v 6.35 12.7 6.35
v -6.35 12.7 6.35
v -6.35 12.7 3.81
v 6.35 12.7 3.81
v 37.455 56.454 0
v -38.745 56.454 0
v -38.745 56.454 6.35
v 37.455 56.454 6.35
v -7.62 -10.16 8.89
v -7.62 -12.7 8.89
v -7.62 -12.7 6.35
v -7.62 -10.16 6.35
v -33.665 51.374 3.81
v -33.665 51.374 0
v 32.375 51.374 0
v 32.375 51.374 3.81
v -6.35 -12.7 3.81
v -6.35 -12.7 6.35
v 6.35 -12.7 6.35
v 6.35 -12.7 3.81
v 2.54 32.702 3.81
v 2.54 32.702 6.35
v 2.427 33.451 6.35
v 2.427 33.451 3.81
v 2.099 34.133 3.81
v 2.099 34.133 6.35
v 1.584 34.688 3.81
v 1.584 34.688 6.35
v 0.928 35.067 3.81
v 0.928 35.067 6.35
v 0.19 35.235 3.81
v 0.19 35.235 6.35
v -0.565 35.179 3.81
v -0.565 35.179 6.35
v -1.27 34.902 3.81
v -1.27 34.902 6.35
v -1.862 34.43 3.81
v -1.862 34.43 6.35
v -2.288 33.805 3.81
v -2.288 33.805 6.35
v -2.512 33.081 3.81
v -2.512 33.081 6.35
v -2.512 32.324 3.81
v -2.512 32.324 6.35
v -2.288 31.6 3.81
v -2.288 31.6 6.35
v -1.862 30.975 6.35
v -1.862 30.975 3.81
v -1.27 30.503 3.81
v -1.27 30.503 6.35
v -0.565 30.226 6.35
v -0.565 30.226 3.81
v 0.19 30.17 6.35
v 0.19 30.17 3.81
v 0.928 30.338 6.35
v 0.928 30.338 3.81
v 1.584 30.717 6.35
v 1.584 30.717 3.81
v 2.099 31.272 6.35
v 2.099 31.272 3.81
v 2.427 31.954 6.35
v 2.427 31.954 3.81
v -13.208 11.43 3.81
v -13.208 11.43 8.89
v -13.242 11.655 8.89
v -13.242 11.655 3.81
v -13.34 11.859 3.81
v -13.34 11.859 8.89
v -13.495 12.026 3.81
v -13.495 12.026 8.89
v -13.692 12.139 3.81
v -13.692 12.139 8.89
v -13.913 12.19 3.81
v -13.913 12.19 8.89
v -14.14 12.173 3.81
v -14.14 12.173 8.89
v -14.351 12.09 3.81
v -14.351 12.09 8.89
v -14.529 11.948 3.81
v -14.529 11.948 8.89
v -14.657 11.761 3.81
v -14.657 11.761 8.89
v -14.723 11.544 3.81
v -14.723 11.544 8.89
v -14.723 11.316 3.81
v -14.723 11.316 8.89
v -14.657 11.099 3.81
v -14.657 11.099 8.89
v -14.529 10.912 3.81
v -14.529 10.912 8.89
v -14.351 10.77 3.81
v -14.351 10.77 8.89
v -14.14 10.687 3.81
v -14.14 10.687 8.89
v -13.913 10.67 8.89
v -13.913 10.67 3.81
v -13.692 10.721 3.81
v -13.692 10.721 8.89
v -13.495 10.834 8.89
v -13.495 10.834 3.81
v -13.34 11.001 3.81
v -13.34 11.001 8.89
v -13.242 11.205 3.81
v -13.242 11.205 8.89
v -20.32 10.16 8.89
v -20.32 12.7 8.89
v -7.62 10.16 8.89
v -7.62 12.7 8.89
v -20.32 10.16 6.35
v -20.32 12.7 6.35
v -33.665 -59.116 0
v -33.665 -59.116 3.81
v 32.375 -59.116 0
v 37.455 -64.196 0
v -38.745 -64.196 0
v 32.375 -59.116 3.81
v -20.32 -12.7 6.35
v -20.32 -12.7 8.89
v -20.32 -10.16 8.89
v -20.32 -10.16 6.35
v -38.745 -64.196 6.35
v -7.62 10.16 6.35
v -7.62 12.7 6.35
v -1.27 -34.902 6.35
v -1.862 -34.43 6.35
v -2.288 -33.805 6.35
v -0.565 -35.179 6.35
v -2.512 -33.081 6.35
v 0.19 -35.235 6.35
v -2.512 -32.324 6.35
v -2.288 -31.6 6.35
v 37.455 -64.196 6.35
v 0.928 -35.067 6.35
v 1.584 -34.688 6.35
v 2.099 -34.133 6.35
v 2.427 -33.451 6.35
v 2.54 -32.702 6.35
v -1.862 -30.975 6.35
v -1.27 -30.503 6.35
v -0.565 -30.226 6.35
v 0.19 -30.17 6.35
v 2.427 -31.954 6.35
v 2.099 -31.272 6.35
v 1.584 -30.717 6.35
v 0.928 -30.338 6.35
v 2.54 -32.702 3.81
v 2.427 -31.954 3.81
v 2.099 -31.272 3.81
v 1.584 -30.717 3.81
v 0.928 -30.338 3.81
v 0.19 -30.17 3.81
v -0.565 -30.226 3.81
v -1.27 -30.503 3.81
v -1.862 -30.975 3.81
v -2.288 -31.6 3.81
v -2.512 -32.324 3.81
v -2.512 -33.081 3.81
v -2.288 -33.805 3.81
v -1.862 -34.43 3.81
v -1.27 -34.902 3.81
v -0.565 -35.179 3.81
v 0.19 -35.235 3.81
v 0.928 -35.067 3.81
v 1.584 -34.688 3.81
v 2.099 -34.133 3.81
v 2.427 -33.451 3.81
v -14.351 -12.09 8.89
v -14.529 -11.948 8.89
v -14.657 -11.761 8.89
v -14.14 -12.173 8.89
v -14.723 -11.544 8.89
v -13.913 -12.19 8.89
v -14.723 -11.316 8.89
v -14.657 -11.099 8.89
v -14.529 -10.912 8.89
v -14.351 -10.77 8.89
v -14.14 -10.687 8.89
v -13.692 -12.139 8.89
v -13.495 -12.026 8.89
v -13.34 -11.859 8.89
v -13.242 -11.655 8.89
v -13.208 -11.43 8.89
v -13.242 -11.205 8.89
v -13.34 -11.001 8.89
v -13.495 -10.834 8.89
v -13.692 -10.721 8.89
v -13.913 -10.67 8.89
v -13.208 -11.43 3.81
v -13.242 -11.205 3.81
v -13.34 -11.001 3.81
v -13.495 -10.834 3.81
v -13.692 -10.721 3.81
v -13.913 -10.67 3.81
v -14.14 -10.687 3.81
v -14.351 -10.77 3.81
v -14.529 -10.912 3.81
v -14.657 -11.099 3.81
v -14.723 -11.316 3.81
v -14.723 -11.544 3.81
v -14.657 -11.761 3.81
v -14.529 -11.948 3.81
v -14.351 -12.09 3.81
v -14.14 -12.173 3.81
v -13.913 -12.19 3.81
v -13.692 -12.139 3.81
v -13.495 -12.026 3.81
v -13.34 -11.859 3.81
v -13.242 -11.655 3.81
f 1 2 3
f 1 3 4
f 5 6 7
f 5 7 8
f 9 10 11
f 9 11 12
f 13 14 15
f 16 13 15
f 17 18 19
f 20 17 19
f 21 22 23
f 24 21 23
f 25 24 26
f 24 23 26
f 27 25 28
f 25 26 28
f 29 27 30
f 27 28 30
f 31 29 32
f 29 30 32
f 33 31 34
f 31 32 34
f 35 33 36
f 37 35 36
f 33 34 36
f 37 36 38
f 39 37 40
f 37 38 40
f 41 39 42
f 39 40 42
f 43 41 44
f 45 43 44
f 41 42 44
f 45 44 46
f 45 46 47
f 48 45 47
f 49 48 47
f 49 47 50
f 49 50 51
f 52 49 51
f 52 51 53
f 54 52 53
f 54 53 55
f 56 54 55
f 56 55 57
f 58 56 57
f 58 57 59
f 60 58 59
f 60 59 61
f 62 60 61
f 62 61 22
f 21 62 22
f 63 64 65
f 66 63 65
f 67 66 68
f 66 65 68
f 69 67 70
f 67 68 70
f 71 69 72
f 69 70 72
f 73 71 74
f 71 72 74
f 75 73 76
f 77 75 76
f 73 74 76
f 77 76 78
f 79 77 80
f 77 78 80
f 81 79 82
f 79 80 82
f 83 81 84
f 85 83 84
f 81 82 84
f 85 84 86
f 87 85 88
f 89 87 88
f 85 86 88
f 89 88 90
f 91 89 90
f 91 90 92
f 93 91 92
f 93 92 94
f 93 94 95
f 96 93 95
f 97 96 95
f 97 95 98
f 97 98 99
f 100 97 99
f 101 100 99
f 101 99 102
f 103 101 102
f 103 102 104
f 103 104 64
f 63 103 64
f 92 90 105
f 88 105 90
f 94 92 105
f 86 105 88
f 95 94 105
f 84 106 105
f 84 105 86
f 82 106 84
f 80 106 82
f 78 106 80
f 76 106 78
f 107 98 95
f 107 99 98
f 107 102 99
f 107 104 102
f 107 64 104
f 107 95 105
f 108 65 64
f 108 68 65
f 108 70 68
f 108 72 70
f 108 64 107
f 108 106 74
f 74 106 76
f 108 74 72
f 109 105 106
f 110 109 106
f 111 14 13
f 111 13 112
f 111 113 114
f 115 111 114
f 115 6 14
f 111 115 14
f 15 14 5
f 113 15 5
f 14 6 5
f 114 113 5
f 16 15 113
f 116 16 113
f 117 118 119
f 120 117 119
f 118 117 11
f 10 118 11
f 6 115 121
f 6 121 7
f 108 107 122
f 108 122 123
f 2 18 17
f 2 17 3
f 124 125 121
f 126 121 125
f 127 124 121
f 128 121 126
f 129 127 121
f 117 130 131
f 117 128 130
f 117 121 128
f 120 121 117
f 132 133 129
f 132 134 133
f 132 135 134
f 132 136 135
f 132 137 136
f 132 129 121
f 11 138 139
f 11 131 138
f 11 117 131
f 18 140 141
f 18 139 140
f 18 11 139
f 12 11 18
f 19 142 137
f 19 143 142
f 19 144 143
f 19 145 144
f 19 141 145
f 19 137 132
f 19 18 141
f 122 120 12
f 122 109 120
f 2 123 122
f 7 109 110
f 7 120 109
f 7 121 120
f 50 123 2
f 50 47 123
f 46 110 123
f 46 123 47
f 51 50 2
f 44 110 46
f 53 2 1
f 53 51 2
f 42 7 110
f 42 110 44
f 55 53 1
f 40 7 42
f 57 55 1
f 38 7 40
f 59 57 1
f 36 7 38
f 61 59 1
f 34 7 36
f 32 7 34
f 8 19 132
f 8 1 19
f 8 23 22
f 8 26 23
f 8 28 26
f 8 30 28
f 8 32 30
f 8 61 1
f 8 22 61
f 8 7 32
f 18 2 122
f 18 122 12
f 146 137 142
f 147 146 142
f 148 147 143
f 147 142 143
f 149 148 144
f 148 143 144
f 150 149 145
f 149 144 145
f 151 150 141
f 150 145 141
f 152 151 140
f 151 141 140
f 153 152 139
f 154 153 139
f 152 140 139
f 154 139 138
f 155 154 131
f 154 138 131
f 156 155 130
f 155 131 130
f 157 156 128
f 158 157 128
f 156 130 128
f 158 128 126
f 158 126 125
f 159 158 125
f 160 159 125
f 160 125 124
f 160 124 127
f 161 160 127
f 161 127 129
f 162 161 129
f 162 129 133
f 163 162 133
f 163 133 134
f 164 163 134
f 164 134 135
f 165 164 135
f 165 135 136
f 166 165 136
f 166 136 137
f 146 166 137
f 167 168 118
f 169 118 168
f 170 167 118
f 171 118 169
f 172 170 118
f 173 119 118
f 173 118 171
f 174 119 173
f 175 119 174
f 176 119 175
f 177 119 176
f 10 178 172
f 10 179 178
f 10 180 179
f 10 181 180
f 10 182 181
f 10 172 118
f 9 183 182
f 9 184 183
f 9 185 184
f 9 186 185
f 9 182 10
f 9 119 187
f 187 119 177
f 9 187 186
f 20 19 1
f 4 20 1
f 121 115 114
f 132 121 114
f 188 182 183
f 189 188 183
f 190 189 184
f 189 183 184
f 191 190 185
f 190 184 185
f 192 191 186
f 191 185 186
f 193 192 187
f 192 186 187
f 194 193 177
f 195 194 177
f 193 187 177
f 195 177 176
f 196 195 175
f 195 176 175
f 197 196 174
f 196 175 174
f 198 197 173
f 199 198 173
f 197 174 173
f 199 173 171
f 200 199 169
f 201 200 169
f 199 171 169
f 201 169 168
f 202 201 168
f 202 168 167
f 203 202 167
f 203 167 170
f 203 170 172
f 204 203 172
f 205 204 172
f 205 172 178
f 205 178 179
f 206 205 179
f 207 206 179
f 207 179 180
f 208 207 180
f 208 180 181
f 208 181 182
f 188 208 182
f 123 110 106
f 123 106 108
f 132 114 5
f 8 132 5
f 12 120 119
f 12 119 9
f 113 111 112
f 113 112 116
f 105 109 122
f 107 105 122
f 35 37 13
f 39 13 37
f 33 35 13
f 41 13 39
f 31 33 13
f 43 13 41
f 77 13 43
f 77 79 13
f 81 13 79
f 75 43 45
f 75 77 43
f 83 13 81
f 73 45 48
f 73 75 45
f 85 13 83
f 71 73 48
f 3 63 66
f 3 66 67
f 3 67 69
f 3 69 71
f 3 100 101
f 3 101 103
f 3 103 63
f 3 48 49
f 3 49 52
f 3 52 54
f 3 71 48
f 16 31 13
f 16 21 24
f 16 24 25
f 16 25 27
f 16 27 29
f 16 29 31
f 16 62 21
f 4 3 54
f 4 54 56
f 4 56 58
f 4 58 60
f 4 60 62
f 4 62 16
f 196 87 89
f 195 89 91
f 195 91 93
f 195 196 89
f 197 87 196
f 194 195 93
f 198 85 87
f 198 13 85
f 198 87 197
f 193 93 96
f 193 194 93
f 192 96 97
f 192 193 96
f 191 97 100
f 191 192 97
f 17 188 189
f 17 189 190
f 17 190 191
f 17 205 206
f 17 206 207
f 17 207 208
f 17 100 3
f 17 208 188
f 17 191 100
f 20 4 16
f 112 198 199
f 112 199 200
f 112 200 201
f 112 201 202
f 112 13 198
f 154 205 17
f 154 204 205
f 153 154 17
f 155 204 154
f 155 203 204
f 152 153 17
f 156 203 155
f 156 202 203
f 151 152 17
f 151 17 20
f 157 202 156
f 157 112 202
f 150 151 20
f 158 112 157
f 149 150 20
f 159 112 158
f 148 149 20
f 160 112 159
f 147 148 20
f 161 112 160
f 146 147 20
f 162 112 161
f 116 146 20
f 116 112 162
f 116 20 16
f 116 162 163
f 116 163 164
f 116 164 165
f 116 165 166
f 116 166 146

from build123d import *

# Parameters (mm, degrees)
F0_W      = 76.2
F0_H      = 120.65
F1_DEPTH  = 6.35
F2_W      = 12.7
F2_H      = 25.4
F3_DEPTH  = 6.35
F4_R      = 2.54
F5_DEPTH  = 6.35
F6_W      = 12.7
F6_H      = 2.54
F7_DEPTH  = 2.54
F8_R      = 0.762
F9_R      = 0.762
F10_DEPTH = 11.938
F11_W     = 66.04
F11_H     = 110.49
F12_DEPTH = 3.81


with BuildPart() as f1:
    # F0 (on Top) → F1 (new body)
    with BuildSketch(Plane.XY):
        with Locations((-0.644507, -3.87145)):
            Rectangle(F0_W, F0_H)
    extrude(amount=F1_DEPTH)

    # F2 (on face) → F3 (cut)
    with BuildSketch(Plane.XY.offset(6.35)):
        Rectangle(F2_W, F2_H)
    extrude(amount=-F3_DEPTH, mode=Mode.SUBTRACT)

    # F4 (on face) → F5 (cut)
    with BuildSketch(Plane.XY.offset(6.35)):
        with Locations((0, -32.7025)):
            Circle(F4_R)
        with Locations((0, 32.7025)):
            Circle(F4_R)
    extrude(amount=-F5_DEPTH, mode=Mode.SUBTRACT)

    # F6 (on face) → F7 (join)
    with BuildSketch(Plane.XY.offset(6.35)):
        with Locations((-13.97, 11.43)):
            Rectangle(F6_W, F6_H)
        with Locations((-13.97, -11.43)):
            Rectangle(F6_W, F6_H)
    extrude(amount=F7_DEPTH)

    # F8 (on face) + F9 (on face) → F10 (cut)
    with BuildSketch(Plane.XY.offset(8.89)):
        with Locations((-13.97, 11.43)):
            Circle(F8_R)
    with BuildSketch(Plane.XY.offset(8.89)):
        with Locations((-13.97, -11.43)):
            Circle(F9_R)
    extrude(amount=-F10_DEPTH, mode=Mode.SUBTRACT)

    # F11 (on face) → F12 (cut)
    with BuildSketch(Plane(origin=(0, 0, 0), x_dir=(1, 0, 0), z_dir=(0, 0, -1))):
        with Locations((-0.644507, 3.87145)):
            Rectangle(F11_W, F11_H)
    extrude(amount=-F12_DEPTH, mode=Mode.SUBTRACT)


solid = f1.part
